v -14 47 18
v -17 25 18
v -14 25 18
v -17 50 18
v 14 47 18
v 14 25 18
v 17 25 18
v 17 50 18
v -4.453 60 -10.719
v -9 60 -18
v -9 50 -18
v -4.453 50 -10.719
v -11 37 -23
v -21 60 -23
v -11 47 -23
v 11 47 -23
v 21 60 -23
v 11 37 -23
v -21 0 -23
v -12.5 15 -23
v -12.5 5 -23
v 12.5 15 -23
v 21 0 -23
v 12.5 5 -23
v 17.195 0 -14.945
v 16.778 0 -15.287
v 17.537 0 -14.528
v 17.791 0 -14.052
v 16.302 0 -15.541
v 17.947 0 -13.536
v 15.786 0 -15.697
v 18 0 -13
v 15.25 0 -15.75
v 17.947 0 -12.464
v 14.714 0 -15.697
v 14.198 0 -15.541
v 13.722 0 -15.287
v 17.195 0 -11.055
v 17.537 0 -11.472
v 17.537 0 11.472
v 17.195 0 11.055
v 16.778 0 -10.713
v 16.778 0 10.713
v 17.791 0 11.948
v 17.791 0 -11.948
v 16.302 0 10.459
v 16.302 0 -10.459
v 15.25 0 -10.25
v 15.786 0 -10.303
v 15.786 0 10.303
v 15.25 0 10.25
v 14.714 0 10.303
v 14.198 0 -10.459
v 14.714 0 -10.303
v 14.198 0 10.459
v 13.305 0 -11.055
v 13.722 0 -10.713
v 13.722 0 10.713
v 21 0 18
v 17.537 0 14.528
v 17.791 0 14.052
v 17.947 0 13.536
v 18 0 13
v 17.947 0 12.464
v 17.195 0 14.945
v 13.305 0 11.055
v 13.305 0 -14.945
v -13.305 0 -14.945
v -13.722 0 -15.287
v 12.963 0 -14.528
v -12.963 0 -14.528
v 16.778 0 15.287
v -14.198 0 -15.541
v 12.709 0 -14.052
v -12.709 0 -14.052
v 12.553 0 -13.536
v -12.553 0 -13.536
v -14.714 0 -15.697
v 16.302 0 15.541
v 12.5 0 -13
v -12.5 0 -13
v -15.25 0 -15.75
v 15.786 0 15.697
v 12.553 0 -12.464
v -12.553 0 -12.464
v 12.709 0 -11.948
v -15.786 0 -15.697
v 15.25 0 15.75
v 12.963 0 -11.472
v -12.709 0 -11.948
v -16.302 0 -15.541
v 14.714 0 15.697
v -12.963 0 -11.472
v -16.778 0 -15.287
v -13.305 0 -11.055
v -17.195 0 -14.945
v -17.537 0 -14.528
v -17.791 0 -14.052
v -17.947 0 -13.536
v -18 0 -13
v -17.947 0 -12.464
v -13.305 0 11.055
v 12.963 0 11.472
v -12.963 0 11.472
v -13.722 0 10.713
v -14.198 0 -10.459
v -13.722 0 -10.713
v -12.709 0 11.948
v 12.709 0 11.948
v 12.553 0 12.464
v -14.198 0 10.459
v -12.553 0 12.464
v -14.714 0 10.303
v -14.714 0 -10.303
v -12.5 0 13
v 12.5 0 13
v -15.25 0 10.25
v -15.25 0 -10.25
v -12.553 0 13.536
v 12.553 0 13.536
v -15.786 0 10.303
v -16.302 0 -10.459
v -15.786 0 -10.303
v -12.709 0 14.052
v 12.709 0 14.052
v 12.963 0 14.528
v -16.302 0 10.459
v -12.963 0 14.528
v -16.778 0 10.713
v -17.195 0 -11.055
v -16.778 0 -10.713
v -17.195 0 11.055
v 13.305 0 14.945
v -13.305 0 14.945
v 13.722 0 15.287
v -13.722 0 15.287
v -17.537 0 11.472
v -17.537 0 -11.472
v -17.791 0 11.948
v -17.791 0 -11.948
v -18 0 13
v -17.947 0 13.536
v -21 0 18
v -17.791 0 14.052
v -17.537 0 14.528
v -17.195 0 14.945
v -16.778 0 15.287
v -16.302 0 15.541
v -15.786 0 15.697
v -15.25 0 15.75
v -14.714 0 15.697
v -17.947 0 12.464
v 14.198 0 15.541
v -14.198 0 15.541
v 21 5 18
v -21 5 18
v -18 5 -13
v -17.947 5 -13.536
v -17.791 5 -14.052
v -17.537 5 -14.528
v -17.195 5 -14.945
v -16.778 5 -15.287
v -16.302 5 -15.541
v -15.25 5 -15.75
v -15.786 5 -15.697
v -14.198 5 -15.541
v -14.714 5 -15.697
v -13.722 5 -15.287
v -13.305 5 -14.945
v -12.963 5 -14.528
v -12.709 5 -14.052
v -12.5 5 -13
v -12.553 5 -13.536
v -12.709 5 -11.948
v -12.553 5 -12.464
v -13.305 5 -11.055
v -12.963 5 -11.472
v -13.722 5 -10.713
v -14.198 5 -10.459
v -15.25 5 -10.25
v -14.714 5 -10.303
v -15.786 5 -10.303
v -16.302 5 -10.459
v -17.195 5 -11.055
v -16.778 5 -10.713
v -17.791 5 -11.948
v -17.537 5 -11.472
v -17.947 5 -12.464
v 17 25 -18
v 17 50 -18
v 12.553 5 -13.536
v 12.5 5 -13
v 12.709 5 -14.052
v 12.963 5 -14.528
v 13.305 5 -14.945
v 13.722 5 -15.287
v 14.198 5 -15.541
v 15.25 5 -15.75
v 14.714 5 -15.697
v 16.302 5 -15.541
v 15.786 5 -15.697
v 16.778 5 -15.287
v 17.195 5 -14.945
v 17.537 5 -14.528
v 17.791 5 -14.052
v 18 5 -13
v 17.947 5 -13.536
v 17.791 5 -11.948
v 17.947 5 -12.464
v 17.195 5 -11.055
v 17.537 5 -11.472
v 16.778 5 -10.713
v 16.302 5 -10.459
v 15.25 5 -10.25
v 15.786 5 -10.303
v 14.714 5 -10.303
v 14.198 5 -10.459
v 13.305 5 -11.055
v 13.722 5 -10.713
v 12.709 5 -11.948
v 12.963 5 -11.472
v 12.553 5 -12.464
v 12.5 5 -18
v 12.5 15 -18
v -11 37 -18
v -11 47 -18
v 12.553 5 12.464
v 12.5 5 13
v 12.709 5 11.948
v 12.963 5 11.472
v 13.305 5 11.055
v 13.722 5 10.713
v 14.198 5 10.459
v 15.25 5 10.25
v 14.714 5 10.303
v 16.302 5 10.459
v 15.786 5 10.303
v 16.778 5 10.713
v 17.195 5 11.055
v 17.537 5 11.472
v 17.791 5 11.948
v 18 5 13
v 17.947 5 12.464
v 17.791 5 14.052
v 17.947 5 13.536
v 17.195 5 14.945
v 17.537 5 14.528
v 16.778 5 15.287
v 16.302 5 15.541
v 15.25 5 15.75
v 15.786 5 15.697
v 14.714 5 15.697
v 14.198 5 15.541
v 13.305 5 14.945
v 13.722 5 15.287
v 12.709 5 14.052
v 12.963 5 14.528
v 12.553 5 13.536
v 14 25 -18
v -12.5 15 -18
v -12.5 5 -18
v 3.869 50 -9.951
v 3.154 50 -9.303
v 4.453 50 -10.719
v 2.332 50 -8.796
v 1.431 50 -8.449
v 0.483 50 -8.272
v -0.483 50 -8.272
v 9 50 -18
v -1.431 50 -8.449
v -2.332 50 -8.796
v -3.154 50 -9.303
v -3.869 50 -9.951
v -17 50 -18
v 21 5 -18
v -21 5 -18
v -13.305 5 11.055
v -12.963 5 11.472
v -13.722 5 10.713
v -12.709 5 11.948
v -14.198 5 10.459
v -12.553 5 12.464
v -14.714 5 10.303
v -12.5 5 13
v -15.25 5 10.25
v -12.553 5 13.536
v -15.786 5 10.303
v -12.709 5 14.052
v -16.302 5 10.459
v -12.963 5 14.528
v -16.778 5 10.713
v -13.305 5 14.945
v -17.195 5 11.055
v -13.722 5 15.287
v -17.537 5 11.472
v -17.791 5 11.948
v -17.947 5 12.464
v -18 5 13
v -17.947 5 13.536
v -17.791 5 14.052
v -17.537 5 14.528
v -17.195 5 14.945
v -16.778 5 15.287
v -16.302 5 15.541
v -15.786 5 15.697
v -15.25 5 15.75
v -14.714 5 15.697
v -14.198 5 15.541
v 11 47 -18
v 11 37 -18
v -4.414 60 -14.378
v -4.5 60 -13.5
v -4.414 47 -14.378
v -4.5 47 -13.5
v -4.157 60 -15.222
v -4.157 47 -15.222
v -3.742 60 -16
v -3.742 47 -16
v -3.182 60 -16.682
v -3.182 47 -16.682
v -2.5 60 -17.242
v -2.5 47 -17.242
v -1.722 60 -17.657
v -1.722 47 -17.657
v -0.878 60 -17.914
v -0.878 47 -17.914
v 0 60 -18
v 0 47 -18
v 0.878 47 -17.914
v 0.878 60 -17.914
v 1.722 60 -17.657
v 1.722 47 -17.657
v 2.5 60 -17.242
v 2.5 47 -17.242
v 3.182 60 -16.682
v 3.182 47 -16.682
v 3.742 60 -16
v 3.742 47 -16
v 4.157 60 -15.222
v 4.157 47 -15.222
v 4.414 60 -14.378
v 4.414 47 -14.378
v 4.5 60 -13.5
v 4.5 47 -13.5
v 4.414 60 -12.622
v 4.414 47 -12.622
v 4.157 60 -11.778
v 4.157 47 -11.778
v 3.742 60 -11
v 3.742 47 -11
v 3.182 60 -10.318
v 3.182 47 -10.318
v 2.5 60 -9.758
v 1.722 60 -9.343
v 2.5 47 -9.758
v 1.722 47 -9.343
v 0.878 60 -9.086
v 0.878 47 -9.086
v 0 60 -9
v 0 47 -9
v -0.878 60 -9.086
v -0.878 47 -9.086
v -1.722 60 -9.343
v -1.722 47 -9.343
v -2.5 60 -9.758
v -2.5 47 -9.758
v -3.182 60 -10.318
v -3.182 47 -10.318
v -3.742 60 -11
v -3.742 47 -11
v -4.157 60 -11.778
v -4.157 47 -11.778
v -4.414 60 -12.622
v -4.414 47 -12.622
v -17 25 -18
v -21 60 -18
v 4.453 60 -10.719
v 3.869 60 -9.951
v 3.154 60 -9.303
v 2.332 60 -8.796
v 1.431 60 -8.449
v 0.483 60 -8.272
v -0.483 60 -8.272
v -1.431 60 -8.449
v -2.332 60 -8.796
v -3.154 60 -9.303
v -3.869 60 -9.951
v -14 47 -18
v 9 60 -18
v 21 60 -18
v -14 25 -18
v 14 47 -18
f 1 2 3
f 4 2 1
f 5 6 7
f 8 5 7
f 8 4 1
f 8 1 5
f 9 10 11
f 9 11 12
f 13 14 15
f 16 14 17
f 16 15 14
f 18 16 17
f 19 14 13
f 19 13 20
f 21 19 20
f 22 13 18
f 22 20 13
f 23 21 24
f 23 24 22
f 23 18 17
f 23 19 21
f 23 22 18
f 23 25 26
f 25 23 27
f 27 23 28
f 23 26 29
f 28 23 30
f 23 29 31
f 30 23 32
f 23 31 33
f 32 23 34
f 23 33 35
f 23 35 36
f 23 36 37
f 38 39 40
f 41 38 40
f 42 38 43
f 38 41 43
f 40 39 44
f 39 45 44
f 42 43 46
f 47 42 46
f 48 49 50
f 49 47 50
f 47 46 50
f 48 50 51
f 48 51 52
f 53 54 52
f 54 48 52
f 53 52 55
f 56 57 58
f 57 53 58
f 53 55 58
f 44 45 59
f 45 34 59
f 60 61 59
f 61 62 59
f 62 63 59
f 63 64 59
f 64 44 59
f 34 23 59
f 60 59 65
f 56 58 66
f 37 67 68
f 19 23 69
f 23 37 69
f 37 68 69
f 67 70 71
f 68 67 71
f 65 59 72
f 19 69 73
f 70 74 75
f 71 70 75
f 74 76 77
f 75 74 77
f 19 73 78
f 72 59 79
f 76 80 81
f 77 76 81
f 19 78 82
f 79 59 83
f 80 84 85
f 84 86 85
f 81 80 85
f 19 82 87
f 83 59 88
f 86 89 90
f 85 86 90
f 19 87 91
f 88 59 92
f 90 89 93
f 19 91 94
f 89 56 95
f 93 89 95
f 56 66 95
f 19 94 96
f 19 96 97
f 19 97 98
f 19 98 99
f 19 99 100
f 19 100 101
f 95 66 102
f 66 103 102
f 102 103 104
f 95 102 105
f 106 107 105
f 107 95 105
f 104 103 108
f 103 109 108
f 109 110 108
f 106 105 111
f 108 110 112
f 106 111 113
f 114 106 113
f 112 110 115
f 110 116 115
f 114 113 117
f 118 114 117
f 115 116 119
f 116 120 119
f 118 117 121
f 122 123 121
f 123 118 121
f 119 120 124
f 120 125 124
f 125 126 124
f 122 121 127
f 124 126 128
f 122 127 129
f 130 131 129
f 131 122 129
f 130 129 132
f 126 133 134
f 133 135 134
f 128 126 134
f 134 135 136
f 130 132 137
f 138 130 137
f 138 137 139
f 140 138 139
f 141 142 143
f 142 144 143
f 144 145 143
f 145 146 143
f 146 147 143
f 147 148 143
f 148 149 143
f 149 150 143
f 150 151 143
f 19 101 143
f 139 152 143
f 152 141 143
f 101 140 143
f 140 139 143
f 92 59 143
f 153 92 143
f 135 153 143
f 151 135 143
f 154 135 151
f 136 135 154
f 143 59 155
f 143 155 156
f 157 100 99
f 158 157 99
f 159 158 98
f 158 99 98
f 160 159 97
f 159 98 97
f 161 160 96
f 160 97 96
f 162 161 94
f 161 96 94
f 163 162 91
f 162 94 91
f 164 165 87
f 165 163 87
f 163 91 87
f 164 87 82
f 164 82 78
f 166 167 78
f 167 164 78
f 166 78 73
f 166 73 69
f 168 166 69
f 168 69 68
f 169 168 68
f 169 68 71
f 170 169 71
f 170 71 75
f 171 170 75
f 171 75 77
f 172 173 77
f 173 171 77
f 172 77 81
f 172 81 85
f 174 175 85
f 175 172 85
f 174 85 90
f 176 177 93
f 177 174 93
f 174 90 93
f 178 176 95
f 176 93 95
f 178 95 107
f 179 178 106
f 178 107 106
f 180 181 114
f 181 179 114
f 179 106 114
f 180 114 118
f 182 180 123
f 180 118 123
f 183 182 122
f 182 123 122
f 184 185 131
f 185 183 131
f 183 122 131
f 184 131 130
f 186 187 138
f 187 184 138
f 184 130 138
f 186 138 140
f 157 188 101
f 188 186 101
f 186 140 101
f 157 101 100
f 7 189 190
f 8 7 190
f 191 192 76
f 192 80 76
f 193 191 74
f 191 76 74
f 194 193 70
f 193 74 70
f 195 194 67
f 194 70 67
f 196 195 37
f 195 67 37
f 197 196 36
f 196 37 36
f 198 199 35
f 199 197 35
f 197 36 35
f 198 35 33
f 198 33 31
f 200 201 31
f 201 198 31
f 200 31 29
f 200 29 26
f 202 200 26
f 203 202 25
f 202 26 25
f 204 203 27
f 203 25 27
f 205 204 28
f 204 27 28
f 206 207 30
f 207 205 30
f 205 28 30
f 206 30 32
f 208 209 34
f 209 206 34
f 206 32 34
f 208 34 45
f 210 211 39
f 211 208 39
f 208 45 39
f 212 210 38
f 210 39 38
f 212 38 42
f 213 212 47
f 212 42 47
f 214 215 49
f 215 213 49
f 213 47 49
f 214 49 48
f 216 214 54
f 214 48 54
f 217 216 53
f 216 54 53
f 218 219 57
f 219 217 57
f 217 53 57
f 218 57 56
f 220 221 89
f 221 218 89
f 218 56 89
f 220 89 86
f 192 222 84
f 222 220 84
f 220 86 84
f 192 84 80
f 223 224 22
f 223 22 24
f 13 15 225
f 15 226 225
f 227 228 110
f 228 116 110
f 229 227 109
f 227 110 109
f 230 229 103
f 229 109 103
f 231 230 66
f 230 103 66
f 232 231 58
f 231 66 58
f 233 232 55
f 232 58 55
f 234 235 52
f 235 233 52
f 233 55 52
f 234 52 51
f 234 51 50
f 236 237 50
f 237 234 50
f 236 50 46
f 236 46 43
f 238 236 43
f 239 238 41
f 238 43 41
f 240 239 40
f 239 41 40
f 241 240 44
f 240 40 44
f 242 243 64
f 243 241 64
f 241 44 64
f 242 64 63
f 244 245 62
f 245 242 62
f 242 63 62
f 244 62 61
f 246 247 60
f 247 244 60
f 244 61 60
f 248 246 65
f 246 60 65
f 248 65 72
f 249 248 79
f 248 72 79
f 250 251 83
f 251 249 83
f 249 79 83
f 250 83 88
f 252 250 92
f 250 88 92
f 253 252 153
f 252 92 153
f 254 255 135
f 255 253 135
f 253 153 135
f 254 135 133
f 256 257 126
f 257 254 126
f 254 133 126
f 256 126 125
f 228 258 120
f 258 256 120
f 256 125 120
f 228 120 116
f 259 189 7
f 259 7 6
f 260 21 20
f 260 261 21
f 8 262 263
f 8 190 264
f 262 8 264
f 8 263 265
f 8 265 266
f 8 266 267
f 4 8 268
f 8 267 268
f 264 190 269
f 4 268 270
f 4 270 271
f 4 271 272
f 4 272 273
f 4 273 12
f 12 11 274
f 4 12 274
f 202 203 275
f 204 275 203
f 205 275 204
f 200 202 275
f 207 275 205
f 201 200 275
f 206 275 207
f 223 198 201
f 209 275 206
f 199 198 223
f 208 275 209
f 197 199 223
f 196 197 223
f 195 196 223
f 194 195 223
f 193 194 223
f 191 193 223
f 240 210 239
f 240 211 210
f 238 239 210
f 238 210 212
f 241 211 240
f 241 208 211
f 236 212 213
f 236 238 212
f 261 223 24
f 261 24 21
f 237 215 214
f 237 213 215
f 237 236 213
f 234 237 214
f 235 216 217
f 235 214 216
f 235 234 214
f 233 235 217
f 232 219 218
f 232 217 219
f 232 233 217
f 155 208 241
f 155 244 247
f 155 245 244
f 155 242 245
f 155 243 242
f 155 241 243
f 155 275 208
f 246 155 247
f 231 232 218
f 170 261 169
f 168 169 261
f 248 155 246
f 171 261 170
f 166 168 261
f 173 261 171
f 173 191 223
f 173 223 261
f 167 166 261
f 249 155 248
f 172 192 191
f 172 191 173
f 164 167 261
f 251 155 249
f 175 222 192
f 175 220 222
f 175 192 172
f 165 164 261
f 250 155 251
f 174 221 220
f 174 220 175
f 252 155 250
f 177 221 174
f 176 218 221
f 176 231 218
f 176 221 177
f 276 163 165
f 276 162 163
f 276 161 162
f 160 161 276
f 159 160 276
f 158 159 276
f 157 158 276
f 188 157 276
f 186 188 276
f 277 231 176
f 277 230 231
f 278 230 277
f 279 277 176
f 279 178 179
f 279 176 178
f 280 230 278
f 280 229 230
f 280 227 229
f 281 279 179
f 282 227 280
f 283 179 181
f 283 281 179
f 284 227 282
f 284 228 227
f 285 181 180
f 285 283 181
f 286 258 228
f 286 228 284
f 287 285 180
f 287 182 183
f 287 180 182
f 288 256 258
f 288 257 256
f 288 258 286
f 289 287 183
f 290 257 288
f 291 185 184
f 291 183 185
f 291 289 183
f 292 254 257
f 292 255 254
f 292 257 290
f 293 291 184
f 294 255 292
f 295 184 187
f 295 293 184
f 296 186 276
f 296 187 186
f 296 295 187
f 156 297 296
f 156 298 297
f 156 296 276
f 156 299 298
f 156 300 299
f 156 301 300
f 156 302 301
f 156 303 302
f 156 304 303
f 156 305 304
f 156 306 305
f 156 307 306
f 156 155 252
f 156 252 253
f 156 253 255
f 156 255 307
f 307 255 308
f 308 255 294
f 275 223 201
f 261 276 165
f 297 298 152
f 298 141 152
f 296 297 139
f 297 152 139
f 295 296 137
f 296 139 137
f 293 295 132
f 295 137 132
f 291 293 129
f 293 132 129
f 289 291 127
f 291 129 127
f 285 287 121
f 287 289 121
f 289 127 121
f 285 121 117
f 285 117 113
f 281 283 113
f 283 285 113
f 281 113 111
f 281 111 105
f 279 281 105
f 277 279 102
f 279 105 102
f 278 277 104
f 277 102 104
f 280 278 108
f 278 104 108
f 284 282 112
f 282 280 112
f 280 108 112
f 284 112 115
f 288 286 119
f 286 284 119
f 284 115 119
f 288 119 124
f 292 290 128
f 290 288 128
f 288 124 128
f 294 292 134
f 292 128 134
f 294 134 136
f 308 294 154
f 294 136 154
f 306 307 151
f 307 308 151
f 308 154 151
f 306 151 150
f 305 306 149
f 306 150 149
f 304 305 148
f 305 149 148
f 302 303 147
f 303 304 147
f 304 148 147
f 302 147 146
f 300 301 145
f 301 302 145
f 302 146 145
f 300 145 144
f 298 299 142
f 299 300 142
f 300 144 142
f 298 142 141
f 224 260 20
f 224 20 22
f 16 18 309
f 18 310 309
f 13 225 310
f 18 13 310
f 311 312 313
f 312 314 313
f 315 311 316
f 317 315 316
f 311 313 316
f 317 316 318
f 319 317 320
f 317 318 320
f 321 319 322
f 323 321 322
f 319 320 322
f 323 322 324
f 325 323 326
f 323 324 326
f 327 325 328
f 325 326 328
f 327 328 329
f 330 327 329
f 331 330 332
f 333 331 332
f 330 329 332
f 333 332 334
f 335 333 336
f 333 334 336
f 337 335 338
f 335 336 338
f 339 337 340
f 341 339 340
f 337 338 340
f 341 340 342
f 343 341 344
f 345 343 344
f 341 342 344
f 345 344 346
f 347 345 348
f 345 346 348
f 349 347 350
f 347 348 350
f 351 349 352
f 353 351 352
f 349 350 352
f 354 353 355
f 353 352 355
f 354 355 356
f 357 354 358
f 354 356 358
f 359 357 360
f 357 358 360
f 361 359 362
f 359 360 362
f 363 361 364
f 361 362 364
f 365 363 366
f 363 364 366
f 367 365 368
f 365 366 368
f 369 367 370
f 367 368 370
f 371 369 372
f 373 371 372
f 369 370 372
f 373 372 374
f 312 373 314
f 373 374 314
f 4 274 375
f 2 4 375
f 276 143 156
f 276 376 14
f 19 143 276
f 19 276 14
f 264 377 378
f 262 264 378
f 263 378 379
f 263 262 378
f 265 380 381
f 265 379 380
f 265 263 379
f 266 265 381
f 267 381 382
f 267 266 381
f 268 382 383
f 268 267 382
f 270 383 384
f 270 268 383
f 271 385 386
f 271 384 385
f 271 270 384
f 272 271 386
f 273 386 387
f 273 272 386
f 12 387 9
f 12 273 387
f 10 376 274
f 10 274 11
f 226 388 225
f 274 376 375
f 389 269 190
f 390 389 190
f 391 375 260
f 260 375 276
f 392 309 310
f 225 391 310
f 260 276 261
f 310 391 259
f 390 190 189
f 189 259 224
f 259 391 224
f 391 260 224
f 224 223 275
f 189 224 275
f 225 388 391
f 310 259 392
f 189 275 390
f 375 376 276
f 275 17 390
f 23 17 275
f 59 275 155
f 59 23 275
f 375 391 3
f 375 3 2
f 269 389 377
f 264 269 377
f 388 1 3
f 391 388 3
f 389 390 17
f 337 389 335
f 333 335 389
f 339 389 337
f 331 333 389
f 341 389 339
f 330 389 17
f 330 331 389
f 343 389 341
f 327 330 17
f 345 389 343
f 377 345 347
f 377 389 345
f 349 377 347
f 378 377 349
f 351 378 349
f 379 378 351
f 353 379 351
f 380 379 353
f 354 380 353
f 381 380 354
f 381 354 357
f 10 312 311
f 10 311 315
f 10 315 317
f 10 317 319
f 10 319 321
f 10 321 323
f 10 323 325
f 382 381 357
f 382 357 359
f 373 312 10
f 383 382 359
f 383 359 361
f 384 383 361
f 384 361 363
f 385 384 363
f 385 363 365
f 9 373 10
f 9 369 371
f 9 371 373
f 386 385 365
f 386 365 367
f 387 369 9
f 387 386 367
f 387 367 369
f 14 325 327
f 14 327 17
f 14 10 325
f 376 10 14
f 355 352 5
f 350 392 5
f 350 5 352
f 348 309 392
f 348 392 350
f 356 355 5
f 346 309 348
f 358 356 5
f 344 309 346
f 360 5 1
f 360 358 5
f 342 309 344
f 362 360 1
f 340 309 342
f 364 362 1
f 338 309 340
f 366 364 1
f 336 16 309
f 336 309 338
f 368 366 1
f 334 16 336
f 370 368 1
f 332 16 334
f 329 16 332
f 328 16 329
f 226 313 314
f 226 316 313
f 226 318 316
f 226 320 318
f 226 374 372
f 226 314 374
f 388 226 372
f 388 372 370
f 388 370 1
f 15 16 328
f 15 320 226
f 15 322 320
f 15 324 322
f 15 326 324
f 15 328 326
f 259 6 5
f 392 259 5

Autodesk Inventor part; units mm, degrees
ref_plane "YZ Plane" through (0, 0, 0) normal (1, 0, 0) x (0, 1, 0)
ref_plane "XZ Plane" through (0, 0, 0) normal (0, 1, 0) x (-1, 0, 0)
ref_plane "XY Plane" through (0, 0, 0) normal (0, 0, 1) x (1, 0, 0)
sketch "Szkic1" plane through (0, 0, 0) normal (0, 1, 0) x (-1, 0, 0)
  line L0 (-21, 18) -> (21, 18)
  line L1 (21, 18) -> (21, -18)
  line L2 (21, -18) -> (-21, -18)
  line L3 (-21, -18) -> (-21, 18)
  line L4 (-21, 18) -> (21, -18) construction
  line L5 (21, 18) -> (-21, -18) construction
  circle A0 centre (-15.25, -13) radius 2.75
  line L6 (0, 18) -> (0, -18)
  line L7 (-21, 0) -> (21, 0)
  circle A1 centre (-15.25, 13) radius 2.75
  line L8 (0, -18) -> (0, 18)
  circle A2 centre (15.25, -13) radius 2.75
  circle A3 centre (15.25, 13) radius 2.75
  line L9 (-21, -18) -> (20.4575, -18)
  line L10 (-21, -18) -> (21, -18)
  line L11 (21, -18) -> (21, -23)
  line L12 (21, -23) -> (-21, -23)
  line L13 (-21, -23) -> (-21, -18)
  circle A4 centre (0, -13.5) radius 4.5
  circle A5 centre (0, -13.5) radius 5.25
  line L14 (9, -18) -> (4.453, -10.7191)
  line L15 (-9, -18) -> (-4.453, -10.7191)
  point P0 (0, 0)
  point P1 (-21, -20.5)
  point P2 (0, -18)
  dimension "d11" = 10.5
  dimension "W12" = 42
  dimension "L12" = 36
  dimension "d2" = 5.5
  dimension "d3" = 5.75
  dimension "d4" = 5
  dimension "d6" = 5
  dimension "d7" = 42
  dimension "SrPopr" = 9
  dimension "d9" = 4.5
  dimension "d12" = 9
extrude "Wyciągnięcie proste1" add sketch "Szkic1" along normal blind 5
extrude "Wyciągnięcie proste2" add sketch "Szkic1" along normal blind 60 contours L2 A5 L11 L12 L13 | A5 L2 A4 L6 | L6 A4 L2 A5 | L15 A5 L2 | L14 L2 A5 | L2 A5
extrude "Wyciągnięcie proste3" cut sketch "Szkic1" along normal blind 50 contours A5 L2 A4 L6 | L6 A4 L2 A5 | L15 A5 L2 | L14 L2 A5
extrude "Wyciągnięcie proste4" add sketch "Szkic1" along normal blind 5 contours A5 L2 A4 L6 | L6 A4 L2 A5 | L15 A5 L2 | L14 L2 A5
sketch "Szkic3" plane through (-21, 5, -18) normal (0, 0, 1) x (1, 0, 0)
  line L0 (42, 0) -> (0, 0) projected
  line L1 (42, 0) -> (42, 55) projected
  line L2 (30, 55) -> (42, 55) projected
  line L3 (30, 45) -> (30, 55) projected
  line L4 (30, 45) -> (21, 45) projected
  line L5 (21, 45) -> (12, 45) projected
  line L6 (12, 45) -> (12, 55) projected
  line L7 (0, 55) -> (12, 55) projected
  line L8 (0, 0) -> (0, 55) projected
  line L9 (35, 42) -> (7, 42)
  line L10 (7, 42) -> (7, 0)
  line L11 (7, 0) -> (35, 0)
  line L12 (35, 0) -> (35, 42)
  line L13 (35, 42) -> (7, 0) construction
  line L14 (7, 42) -> (35, 0) construction
  line L15 (42, 0) -> (42, 55) projected
  line L16 (0, 0) -> (0, 55) projected
  line L17 (0, 0) -> (42, 0) projected
  line L18 (21, 0) -> (21, 42)
  line L19 (38, 0) -> (38, 45)
  line L20 (4, 45) -> (4, 0)
  line L21 (38, 45) -> (4, 45)
  line L22 (33.5, 0) -> (8.5, 0)
  line L23 (8.5, 0) -> (8.5, 10)
  line L24 (8.5, 10) -> (33.5, 10)
  line L25 (33.5, 10) -> (33.5, 0)
  line L26 (32, 42) -> (10, 42)
  line L27 (10, 42) -> (10, 32)
  line L28 (10, 32) -> (32, 32)
  line L29 (32, 32) -> (32, 42)
  line L30 (38, 20) -> (4, 20)
  point P0 (21, -5)
  point P1 (21, 21)
  point P2 (21, 0)
  point P3 (4, 0)
  point P4 (38, 0)
  point P5 (8.5, 0)
  point P6 (33.5, 0)
  point P7 (35, 20)
  point P8 (7, 20)
  dimension "d21" = 28
  dimension "d22" = 42
  dimension "GruboscAku" = 3
  dimension "d33" = 3
  dimension "d34" = 10
  dimension "d35" = 25
  dimension "d36" = 10
  dimension "d37" = 22
  dimension "d42" = 20
extrude "Wyciągnięcie proste5" add sketch "Szkic3" along normal blind 36 contours L30 L12 L9 L10 L20 L21 L5 L4 L19
extrude "Wyciągnięcie proste6" cut sketch "Szkic3" against normal blind 5 contours L0 L18 L24 L25 | L0 L23 L24 L18 | L29 L28 L18 L9 | L28 L27 L9 L18
extrude "Wyciągnięcie proste7" cut sketch "Szkic1" along normal blind 50 contours A4 L6 | L6 A4
extrude "Wyciągnięcie proste8" add sketch "Szkic1" along normal blind 5 contours A4 L6 | L6 A4
equation "\"d7\" = W12"
equation "\"d9\" = 0.5 * SrPopr"
equation "\"d33\" = GruboscAku"
properties part number "KatownikNowy"
